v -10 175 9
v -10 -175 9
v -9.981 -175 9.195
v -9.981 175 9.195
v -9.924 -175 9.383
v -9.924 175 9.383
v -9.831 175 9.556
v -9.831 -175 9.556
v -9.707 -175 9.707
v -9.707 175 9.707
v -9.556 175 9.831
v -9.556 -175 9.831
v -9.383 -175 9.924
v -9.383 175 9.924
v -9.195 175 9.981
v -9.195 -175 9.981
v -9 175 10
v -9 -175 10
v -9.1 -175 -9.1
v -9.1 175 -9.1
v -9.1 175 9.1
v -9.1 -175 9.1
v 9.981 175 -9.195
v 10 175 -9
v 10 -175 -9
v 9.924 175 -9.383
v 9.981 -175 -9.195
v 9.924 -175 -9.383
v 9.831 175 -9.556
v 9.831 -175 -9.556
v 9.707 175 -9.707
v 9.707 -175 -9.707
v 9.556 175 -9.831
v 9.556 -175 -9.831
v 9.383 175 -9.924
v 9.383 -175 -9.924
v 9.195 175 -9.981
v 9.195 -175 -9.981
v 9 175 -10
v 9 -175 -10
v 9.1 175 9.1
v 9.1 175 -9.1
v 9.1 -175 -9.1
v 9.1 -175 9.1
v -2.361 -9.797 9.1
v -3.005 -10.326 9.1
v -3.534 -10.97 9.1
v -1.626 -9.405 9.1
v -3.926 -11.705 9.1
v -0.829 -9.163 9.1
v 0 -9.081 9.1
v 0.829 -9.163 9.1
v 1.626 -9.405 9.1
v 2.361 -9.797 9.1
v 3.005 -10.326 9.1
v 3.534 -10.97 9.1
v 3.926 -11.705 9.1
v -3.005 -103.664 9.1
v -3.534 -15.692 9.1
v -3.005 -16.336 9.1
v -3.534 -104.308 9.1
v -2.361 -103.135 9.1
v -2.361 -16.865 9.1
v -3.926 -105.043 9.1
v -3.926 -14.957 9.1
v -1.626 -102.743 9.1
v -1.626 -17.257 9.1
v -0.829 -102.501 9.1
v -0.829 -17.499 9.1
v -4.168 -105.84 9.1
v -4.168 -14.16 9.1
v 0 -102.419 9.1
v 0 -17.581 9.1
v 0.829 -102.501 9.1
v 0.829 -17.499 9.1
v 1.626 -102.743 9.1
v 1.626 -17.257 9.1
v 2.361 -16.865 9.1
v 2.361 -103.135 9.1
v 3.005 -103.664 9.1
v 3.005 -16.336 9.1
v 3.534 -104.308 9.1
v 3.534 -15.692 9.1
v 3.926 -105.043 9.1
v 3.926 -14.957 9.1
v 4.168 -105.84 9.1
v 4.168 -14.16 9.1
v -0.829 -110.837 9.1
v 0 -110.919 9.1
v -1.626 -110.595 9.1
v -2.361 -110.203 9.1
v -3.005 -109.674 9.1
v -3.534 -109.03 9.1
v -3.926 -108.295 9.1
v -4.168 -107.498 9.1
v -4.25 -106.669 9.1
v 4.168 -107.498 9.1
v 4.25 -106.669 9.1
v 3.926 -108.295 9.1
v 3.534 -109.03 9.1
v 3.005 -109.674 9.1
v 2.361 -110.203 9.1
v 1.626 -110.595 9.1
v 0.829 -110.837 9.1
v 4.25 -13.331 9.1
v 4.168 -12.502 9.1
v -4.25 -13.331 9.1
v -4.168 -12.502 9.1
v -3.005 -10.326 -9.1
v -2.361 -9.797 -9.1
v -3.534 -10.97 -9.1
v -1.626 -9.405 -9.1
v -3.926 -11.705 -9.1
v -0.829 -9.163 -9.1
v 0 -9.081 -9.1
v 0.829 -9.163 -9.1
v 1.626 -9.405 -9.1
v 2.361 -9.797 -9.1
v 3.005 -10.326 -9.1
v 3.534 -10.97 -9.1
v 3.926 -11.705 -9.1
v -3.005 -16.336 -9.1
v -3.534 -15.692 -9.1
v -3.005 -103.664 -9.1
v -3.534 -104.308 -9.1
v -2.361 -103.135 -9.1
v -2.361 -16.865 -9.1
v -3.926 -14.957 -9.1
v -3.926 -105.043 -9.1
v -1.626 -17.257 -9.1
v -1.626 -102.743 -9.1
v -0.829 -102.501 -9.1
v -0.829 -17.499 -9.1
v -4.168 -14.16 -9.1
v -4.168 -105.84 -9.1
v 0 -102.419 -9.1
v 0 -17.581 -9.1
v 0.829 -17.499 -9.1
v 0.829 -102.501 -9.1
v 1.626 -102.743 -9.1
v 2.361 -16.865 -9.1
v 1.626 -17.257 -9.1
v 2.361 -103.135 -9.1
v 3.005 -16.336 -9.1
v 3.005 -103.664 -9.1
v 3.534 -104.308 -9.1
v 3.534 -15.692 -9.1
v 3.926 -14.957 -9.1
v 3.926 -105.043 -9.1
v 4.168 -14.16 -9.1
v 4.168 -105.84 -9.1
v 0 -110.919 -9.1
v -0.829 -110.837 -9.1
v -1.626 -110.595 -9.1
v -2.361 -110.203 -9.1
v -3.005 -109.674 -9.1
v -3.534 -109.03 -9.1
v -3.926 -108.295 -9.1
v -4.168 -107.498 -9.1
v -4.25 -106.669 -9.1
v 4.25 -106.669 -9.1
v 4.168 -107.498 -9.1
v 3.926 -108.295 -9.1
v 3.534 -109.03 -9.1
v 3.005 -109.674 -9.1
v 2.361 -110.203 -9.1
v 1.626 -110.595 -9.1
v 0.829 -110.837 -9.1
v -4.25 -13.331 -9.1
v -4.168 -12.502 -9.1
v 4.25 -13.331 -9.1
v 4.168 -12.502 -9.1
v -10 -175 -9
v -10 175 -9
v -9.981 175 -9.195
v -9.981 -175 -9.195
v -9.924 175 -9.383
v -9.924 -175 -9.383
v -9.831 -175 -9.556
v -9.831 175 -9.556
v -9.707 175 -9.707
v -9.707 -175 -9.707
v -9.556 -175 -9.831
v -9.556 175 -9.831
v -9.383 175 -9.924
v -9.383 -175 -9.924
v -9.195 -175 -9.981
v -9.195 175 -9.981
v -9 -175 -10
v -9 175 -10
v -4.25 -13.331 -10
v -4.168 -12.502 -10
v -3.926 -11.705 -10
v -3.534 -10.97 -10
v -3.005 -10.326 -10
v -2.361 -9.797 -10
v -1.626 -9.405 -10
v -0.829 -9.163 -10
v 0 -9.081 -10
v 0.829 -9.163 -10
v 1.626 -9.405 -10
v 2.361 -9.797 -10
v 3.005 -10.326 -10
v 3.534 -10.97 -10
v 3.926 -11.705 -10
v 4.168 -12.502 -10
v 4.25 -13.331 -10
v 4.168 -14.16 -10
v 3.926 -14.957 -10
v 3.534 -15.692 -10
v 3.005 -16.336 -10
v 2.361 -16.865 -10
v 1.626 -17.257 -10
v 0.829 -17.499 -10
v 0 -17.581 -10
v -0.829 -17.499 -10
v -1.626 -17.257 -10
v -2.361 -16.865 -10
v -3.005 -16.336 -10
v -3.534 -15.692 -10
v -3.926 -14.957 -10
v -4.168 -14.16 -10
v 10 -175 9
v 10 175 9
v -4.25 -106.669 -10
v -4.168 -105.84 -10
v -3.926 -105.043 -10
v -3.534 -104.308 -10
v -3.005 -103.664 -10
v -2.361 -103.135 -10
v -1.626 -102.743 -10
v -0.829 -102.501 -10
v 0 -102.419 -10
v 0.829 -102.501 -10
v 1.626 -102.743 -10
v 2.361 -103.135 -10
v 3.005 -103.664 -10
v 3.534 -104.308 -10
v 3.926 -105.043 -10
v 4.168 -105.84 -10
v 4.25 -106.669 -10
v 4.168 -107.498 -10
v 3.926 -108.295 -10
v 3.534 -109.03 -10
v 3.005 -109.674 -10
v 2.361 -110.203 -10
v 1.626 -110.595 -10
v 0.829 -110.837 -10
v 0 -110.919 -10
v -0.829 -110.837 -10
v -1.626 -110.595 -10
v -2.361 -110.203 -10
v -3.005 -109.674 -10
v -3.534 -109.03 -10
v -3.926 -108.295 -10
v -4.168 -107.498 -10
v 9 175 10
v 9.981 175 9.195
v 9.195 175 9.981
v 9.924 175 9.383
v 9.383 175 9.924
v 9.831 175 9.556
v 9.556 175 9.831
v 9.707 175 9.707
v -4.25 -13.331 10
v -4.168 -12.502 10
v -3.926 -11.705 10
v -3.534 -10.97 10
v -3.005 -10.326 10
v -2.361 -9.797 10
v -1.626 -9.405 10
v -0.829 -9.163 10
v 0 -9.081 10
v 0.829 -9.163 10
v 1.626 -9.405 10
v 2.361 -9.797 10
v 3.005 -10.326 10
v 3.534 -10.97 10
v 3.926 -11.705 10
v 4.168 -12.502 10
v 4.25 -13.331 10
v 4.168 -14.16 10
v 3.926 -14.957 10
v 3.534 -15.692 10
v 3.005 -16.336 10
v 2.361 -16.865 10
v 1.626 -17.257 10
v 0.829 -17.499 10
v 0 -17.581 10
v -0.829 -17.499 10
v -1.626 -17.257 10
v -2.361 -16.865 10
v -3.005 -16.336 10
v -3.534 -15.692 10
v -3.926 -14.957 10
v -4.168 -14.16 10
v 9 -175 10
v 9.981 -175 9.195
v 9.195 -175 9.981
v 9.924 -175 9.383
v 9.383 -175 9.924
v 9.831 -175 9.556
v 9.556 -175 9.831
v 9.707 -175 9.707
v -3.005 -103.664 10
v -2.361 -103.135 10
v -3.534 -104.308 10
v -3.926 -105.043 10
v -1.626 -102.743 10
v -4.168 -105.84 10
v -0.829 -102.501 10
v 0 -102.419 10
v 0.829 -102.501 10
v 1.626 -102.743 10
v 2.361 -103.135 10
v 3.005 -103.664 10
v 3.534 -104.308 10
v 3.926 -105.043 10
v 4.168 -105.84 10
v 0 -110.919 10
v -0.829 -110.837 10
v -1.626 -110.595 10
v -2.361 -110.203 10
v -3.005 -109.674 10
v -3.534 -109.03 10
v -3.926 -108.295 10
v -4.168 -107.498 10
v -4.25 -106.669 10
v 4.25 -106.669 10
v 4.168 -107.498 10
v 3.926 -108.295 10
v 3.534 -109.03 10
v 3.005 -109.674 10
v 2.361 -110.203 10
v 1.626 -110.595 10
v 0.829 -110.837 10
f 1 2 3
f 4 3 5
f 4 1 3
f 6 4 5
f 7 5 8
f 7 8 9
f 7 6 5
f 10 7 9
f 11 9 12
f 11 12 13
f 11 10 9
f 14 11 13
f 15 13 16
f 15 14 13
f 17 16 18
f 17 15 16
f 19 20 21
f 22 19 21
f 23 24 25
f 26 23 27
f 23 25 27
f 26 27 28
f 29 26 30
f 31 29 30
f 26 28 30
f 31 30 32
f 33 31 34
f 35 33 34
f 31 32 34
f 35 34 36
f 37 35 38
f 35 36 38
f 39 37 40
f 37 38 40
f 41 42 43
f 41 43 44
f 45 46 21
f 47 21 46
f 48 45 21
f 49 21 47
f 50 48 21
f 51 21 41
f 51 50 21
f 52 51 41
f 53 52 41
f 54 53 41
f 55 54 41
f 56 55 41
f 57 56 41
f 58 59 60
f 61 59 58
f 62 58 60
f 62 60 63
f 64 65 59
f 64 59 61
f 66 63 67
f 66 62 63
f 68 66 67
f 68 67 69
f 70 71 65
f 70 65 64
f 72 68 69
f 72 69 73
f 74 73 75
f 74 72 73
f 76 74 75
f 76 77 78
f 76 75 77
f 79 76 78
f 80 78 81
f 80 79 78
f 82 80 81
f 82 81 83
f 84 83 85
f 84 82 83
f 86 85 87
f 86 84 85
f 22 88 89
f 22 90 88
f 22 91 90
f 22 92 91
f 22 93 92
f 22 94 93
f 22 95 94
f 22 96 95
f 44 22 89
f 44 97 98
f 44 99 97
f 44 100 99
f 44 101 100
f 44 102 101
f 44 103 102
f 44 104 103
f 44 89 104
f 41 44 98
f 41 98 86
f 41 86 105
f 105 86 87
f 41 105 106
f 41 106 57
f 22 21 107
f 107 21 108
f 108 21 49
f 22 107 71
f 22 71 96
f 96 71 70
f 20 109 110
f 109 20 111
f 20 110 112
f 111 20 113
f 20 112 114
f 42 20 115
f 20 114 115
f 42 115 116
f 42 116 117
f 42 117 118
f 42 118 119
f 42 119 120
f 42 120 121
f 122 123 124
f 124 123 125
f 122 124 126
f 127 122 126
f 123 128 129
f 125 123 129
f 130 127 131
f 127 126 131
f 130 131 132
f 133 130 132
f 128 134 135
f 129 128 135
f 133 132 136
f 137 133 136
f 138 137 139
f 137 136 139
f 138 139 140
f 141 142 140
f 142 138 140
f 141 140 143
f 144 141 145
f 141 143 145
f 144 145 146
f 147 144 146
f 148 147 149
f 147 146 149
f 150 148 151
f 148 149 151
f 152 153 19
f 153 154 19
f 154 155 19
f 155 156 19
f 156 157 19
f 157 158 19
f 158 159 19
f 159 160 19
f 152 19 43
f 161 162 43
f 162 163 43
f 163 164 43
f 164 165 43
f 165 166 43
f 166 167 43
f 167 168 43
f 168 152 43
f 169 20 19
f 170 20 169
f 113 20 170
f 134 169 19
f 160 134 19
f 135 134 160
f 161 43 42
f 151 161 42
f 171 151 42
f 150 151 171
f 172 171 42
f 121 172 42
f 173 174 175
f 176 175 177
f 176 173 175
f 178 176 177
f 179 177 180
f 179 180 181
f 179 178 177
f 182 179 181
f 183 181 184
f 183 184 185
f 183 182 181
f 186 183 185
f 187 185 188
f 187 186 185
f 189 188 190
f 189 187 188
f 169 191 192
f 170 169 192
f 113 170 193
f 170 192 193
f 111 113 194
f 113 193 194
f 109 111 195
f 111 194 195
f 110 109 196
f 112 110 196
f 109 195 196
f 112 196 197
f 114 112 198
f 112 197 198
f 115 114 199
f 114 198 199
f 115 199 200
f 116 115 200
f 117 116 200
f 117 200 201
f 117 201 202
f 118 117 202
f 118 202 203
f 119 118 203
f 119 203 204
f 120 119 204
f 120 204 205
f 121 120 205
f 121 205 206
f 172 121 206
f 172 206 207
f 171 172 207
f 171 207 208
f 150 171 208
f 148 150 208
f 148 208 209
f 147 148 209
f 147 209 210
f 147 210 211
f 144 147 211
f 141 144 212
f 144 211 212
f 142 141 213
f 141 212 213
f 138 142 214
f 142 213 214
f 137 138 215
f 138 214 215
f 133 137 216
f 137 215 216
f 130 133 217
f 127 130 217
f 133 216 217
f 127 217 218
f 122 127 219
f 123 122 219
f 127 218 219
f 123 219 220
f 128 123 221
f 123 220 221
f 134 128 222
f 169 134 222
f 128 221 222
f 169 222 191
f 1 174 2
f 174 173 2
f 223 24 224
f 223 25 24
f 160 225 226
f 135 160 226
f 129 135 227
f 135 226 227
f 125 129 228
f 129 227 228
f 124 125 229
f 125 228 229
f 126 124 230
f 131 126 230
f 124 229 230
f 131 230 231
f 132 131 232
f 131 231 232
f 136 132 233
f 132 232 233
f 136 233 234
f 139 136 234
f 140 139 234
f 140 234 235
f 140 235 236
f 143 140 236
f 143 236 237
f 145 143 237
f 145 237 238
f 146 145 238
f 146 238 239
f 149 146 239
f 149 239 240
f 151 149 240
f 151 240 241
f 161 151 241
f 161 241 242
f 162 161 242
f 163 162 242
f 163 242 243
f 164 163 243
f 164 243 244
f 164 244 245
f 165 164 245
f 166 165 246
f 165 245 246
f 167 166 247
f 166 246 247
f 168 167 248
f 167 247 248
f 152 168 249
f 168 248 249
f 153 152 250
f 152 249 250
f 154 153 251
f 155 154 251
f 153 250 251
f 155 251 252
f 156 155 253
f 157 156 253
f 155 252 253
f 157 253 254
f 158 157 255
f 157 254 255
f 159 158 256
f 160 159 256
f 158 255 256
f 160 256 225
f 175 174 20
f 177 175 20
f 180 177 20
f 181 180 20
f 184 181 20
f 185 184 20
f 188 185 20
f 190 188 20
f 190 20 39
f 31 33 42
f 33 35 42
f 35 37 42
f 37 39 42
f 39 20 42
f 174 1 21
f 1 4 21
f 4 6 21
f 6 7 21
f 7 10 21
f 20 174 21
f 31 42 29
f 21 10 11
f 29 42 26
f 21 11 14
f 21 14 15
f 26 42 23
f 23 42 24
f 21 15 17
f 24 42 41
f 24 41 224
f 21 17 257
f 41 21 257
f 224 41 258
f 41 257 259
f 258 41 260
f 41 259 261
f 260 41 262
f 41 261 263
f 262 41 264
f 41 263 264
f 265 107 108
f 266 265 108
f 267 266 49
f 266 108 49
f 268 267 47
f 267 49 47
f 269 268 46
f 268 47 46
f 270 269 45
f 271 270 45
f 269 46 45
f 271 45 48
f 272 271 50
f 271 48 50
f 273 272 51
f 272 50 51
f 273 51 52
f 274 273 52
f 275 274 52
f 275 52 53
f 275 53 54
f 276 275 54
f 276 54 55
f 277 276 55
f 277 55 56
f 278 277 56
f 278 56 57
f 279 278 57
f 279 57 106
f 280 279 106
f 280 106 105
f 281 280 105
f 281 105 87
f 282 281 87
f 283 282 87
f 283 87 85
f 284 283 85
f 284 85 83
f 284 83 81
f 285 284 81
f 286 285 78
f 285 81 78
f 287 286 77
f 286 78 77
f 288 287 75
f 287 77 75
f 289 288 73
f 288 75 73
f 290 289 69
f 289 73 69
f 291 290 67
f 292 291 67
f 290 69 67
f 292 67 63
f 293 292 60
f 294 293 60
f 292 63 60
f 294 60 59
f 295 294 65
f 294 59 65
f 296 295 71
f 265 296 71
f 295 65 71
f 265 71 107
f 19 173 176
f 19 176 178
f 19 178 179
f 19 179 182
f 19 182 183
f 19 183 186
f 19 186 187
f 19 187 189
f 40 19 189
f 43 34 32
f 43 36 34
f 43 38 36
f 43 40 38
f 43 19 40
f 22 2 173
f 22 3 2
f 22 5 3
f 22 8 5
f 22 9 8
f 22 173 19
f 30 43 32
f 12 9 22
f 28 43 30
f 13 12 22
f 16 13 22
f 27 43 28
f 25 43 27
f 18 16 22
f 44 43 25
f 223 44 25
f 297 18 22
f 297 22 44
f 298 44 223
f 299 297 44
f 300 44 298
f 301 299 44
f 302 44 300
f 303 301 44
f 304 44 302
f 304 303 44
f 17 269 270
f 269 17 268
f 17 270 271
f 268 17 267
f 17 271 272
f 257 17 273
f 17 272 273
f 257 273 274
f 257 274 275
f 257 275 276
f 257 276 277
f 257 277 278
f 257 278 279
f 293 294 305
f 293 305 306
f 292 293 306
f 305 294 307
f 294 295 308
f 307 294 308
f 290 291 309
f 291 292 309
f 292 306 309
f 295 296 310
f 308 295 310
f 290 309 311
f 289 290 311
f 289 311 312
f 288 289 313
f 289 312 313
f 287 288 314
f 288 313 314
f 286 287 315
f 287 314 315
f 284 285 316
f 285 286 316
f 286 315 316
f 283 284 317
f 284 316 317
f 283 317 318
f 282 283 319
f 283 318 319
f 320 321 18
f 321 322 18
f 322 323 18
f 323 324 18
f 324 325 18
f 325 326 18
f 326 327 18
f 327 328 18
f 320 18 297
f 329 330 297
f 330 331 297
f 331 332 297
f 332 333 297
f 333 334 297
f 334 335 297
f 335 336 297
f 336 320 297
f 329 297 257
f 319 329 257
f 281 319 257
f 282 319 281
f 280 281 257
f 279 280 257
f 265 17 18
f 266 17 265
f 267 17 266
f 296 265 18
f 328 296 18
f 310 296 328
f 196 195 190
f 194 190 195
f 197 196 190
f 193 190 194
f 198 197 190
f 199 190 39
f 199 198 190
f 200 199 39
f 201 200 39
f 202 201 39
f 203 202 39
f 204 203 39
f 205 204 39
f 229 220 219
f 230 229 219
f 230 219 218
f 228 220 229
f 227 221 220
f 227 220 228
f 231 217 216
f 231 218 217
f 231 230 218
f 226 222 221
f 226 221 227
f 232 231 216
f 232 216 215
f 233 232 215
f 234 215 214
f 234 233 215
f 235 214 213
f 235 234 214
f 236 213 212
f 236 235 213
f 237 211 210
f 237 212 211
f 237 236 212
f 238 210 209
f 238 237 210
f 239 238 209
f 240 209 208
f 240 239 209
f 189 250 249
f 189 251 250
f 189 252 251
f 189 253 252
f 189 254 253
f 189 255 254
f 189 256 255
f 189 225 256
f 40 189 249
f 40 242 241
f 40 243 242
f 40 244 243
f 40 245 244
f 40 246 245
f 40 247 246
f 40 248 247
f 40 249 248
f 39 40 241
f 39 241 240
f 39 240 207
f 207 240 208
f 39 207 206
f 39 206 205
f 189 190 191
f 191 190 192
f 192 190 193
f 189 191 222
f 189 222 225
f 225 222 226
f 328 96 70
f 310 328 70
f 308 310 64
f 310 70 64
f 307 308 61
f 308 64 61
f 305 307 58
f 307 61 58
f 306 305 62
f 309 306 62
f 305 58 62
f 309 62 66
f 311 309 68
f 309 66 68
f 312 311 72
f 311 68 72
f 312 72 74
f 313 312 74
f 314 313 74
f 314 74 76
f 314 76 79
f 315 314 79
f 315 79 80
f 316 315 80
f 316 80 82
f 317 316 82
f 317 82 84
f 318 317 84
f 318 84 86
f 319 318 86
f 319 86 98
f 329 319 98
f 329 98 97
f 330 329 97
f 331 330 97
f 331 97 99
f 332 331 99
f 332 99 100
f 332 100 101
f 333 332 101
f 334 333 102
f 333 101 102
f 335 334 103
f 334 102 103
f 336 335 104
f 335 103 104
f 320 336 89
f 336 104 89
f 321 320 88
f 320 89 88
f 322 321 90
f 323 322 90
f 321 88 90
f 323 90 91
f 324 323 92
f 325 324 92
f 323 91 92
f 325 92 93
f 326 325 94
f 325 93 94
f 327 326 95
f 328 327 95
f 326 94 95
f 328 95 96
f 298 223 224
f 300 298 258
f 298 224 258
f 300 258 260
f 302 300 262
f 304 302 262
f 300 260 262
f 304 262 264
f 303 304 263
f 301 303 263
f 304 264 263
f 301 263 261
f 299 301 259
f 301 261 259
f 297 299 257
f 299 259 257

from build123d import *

# Parameters (mm, degrees)
F0_W     = 20
F0_H     = 20
F0_W_2   = 18.2
F0_H_2   = 18.2
F1_DEPTH = 175
F2_R     = 1
F4_D     = 8.5


with BuildPart() as f1:
    # F0 (on Front) → F1 (new body, symmetric)
    with BuildSketch(Plane.XZ):
        Rectangle(F0_W, F0_H)
        Rectangle(F0_W_2, F0_H_2, mode=Mode.SUBTRACT)
    extrude(amount=F1_DEPTH, both=True)

    # F2
    f2_edges = [f1.edges().sort_by_distance(p)[0] for p in [
        (10, 0, 10),
        (-10, 0, 10),
        (10, 0, -10),
        (-10, 0, -10),
    ]]
    fillet(f2_edges, radius=F2_R)

    # F4 (through all)
    with Locations(Plane.XY.offset(10)):
        with Locations((0, -13.331), (0, -106.669)):
            Hole(F4_D / 2)


solid = f1.part
